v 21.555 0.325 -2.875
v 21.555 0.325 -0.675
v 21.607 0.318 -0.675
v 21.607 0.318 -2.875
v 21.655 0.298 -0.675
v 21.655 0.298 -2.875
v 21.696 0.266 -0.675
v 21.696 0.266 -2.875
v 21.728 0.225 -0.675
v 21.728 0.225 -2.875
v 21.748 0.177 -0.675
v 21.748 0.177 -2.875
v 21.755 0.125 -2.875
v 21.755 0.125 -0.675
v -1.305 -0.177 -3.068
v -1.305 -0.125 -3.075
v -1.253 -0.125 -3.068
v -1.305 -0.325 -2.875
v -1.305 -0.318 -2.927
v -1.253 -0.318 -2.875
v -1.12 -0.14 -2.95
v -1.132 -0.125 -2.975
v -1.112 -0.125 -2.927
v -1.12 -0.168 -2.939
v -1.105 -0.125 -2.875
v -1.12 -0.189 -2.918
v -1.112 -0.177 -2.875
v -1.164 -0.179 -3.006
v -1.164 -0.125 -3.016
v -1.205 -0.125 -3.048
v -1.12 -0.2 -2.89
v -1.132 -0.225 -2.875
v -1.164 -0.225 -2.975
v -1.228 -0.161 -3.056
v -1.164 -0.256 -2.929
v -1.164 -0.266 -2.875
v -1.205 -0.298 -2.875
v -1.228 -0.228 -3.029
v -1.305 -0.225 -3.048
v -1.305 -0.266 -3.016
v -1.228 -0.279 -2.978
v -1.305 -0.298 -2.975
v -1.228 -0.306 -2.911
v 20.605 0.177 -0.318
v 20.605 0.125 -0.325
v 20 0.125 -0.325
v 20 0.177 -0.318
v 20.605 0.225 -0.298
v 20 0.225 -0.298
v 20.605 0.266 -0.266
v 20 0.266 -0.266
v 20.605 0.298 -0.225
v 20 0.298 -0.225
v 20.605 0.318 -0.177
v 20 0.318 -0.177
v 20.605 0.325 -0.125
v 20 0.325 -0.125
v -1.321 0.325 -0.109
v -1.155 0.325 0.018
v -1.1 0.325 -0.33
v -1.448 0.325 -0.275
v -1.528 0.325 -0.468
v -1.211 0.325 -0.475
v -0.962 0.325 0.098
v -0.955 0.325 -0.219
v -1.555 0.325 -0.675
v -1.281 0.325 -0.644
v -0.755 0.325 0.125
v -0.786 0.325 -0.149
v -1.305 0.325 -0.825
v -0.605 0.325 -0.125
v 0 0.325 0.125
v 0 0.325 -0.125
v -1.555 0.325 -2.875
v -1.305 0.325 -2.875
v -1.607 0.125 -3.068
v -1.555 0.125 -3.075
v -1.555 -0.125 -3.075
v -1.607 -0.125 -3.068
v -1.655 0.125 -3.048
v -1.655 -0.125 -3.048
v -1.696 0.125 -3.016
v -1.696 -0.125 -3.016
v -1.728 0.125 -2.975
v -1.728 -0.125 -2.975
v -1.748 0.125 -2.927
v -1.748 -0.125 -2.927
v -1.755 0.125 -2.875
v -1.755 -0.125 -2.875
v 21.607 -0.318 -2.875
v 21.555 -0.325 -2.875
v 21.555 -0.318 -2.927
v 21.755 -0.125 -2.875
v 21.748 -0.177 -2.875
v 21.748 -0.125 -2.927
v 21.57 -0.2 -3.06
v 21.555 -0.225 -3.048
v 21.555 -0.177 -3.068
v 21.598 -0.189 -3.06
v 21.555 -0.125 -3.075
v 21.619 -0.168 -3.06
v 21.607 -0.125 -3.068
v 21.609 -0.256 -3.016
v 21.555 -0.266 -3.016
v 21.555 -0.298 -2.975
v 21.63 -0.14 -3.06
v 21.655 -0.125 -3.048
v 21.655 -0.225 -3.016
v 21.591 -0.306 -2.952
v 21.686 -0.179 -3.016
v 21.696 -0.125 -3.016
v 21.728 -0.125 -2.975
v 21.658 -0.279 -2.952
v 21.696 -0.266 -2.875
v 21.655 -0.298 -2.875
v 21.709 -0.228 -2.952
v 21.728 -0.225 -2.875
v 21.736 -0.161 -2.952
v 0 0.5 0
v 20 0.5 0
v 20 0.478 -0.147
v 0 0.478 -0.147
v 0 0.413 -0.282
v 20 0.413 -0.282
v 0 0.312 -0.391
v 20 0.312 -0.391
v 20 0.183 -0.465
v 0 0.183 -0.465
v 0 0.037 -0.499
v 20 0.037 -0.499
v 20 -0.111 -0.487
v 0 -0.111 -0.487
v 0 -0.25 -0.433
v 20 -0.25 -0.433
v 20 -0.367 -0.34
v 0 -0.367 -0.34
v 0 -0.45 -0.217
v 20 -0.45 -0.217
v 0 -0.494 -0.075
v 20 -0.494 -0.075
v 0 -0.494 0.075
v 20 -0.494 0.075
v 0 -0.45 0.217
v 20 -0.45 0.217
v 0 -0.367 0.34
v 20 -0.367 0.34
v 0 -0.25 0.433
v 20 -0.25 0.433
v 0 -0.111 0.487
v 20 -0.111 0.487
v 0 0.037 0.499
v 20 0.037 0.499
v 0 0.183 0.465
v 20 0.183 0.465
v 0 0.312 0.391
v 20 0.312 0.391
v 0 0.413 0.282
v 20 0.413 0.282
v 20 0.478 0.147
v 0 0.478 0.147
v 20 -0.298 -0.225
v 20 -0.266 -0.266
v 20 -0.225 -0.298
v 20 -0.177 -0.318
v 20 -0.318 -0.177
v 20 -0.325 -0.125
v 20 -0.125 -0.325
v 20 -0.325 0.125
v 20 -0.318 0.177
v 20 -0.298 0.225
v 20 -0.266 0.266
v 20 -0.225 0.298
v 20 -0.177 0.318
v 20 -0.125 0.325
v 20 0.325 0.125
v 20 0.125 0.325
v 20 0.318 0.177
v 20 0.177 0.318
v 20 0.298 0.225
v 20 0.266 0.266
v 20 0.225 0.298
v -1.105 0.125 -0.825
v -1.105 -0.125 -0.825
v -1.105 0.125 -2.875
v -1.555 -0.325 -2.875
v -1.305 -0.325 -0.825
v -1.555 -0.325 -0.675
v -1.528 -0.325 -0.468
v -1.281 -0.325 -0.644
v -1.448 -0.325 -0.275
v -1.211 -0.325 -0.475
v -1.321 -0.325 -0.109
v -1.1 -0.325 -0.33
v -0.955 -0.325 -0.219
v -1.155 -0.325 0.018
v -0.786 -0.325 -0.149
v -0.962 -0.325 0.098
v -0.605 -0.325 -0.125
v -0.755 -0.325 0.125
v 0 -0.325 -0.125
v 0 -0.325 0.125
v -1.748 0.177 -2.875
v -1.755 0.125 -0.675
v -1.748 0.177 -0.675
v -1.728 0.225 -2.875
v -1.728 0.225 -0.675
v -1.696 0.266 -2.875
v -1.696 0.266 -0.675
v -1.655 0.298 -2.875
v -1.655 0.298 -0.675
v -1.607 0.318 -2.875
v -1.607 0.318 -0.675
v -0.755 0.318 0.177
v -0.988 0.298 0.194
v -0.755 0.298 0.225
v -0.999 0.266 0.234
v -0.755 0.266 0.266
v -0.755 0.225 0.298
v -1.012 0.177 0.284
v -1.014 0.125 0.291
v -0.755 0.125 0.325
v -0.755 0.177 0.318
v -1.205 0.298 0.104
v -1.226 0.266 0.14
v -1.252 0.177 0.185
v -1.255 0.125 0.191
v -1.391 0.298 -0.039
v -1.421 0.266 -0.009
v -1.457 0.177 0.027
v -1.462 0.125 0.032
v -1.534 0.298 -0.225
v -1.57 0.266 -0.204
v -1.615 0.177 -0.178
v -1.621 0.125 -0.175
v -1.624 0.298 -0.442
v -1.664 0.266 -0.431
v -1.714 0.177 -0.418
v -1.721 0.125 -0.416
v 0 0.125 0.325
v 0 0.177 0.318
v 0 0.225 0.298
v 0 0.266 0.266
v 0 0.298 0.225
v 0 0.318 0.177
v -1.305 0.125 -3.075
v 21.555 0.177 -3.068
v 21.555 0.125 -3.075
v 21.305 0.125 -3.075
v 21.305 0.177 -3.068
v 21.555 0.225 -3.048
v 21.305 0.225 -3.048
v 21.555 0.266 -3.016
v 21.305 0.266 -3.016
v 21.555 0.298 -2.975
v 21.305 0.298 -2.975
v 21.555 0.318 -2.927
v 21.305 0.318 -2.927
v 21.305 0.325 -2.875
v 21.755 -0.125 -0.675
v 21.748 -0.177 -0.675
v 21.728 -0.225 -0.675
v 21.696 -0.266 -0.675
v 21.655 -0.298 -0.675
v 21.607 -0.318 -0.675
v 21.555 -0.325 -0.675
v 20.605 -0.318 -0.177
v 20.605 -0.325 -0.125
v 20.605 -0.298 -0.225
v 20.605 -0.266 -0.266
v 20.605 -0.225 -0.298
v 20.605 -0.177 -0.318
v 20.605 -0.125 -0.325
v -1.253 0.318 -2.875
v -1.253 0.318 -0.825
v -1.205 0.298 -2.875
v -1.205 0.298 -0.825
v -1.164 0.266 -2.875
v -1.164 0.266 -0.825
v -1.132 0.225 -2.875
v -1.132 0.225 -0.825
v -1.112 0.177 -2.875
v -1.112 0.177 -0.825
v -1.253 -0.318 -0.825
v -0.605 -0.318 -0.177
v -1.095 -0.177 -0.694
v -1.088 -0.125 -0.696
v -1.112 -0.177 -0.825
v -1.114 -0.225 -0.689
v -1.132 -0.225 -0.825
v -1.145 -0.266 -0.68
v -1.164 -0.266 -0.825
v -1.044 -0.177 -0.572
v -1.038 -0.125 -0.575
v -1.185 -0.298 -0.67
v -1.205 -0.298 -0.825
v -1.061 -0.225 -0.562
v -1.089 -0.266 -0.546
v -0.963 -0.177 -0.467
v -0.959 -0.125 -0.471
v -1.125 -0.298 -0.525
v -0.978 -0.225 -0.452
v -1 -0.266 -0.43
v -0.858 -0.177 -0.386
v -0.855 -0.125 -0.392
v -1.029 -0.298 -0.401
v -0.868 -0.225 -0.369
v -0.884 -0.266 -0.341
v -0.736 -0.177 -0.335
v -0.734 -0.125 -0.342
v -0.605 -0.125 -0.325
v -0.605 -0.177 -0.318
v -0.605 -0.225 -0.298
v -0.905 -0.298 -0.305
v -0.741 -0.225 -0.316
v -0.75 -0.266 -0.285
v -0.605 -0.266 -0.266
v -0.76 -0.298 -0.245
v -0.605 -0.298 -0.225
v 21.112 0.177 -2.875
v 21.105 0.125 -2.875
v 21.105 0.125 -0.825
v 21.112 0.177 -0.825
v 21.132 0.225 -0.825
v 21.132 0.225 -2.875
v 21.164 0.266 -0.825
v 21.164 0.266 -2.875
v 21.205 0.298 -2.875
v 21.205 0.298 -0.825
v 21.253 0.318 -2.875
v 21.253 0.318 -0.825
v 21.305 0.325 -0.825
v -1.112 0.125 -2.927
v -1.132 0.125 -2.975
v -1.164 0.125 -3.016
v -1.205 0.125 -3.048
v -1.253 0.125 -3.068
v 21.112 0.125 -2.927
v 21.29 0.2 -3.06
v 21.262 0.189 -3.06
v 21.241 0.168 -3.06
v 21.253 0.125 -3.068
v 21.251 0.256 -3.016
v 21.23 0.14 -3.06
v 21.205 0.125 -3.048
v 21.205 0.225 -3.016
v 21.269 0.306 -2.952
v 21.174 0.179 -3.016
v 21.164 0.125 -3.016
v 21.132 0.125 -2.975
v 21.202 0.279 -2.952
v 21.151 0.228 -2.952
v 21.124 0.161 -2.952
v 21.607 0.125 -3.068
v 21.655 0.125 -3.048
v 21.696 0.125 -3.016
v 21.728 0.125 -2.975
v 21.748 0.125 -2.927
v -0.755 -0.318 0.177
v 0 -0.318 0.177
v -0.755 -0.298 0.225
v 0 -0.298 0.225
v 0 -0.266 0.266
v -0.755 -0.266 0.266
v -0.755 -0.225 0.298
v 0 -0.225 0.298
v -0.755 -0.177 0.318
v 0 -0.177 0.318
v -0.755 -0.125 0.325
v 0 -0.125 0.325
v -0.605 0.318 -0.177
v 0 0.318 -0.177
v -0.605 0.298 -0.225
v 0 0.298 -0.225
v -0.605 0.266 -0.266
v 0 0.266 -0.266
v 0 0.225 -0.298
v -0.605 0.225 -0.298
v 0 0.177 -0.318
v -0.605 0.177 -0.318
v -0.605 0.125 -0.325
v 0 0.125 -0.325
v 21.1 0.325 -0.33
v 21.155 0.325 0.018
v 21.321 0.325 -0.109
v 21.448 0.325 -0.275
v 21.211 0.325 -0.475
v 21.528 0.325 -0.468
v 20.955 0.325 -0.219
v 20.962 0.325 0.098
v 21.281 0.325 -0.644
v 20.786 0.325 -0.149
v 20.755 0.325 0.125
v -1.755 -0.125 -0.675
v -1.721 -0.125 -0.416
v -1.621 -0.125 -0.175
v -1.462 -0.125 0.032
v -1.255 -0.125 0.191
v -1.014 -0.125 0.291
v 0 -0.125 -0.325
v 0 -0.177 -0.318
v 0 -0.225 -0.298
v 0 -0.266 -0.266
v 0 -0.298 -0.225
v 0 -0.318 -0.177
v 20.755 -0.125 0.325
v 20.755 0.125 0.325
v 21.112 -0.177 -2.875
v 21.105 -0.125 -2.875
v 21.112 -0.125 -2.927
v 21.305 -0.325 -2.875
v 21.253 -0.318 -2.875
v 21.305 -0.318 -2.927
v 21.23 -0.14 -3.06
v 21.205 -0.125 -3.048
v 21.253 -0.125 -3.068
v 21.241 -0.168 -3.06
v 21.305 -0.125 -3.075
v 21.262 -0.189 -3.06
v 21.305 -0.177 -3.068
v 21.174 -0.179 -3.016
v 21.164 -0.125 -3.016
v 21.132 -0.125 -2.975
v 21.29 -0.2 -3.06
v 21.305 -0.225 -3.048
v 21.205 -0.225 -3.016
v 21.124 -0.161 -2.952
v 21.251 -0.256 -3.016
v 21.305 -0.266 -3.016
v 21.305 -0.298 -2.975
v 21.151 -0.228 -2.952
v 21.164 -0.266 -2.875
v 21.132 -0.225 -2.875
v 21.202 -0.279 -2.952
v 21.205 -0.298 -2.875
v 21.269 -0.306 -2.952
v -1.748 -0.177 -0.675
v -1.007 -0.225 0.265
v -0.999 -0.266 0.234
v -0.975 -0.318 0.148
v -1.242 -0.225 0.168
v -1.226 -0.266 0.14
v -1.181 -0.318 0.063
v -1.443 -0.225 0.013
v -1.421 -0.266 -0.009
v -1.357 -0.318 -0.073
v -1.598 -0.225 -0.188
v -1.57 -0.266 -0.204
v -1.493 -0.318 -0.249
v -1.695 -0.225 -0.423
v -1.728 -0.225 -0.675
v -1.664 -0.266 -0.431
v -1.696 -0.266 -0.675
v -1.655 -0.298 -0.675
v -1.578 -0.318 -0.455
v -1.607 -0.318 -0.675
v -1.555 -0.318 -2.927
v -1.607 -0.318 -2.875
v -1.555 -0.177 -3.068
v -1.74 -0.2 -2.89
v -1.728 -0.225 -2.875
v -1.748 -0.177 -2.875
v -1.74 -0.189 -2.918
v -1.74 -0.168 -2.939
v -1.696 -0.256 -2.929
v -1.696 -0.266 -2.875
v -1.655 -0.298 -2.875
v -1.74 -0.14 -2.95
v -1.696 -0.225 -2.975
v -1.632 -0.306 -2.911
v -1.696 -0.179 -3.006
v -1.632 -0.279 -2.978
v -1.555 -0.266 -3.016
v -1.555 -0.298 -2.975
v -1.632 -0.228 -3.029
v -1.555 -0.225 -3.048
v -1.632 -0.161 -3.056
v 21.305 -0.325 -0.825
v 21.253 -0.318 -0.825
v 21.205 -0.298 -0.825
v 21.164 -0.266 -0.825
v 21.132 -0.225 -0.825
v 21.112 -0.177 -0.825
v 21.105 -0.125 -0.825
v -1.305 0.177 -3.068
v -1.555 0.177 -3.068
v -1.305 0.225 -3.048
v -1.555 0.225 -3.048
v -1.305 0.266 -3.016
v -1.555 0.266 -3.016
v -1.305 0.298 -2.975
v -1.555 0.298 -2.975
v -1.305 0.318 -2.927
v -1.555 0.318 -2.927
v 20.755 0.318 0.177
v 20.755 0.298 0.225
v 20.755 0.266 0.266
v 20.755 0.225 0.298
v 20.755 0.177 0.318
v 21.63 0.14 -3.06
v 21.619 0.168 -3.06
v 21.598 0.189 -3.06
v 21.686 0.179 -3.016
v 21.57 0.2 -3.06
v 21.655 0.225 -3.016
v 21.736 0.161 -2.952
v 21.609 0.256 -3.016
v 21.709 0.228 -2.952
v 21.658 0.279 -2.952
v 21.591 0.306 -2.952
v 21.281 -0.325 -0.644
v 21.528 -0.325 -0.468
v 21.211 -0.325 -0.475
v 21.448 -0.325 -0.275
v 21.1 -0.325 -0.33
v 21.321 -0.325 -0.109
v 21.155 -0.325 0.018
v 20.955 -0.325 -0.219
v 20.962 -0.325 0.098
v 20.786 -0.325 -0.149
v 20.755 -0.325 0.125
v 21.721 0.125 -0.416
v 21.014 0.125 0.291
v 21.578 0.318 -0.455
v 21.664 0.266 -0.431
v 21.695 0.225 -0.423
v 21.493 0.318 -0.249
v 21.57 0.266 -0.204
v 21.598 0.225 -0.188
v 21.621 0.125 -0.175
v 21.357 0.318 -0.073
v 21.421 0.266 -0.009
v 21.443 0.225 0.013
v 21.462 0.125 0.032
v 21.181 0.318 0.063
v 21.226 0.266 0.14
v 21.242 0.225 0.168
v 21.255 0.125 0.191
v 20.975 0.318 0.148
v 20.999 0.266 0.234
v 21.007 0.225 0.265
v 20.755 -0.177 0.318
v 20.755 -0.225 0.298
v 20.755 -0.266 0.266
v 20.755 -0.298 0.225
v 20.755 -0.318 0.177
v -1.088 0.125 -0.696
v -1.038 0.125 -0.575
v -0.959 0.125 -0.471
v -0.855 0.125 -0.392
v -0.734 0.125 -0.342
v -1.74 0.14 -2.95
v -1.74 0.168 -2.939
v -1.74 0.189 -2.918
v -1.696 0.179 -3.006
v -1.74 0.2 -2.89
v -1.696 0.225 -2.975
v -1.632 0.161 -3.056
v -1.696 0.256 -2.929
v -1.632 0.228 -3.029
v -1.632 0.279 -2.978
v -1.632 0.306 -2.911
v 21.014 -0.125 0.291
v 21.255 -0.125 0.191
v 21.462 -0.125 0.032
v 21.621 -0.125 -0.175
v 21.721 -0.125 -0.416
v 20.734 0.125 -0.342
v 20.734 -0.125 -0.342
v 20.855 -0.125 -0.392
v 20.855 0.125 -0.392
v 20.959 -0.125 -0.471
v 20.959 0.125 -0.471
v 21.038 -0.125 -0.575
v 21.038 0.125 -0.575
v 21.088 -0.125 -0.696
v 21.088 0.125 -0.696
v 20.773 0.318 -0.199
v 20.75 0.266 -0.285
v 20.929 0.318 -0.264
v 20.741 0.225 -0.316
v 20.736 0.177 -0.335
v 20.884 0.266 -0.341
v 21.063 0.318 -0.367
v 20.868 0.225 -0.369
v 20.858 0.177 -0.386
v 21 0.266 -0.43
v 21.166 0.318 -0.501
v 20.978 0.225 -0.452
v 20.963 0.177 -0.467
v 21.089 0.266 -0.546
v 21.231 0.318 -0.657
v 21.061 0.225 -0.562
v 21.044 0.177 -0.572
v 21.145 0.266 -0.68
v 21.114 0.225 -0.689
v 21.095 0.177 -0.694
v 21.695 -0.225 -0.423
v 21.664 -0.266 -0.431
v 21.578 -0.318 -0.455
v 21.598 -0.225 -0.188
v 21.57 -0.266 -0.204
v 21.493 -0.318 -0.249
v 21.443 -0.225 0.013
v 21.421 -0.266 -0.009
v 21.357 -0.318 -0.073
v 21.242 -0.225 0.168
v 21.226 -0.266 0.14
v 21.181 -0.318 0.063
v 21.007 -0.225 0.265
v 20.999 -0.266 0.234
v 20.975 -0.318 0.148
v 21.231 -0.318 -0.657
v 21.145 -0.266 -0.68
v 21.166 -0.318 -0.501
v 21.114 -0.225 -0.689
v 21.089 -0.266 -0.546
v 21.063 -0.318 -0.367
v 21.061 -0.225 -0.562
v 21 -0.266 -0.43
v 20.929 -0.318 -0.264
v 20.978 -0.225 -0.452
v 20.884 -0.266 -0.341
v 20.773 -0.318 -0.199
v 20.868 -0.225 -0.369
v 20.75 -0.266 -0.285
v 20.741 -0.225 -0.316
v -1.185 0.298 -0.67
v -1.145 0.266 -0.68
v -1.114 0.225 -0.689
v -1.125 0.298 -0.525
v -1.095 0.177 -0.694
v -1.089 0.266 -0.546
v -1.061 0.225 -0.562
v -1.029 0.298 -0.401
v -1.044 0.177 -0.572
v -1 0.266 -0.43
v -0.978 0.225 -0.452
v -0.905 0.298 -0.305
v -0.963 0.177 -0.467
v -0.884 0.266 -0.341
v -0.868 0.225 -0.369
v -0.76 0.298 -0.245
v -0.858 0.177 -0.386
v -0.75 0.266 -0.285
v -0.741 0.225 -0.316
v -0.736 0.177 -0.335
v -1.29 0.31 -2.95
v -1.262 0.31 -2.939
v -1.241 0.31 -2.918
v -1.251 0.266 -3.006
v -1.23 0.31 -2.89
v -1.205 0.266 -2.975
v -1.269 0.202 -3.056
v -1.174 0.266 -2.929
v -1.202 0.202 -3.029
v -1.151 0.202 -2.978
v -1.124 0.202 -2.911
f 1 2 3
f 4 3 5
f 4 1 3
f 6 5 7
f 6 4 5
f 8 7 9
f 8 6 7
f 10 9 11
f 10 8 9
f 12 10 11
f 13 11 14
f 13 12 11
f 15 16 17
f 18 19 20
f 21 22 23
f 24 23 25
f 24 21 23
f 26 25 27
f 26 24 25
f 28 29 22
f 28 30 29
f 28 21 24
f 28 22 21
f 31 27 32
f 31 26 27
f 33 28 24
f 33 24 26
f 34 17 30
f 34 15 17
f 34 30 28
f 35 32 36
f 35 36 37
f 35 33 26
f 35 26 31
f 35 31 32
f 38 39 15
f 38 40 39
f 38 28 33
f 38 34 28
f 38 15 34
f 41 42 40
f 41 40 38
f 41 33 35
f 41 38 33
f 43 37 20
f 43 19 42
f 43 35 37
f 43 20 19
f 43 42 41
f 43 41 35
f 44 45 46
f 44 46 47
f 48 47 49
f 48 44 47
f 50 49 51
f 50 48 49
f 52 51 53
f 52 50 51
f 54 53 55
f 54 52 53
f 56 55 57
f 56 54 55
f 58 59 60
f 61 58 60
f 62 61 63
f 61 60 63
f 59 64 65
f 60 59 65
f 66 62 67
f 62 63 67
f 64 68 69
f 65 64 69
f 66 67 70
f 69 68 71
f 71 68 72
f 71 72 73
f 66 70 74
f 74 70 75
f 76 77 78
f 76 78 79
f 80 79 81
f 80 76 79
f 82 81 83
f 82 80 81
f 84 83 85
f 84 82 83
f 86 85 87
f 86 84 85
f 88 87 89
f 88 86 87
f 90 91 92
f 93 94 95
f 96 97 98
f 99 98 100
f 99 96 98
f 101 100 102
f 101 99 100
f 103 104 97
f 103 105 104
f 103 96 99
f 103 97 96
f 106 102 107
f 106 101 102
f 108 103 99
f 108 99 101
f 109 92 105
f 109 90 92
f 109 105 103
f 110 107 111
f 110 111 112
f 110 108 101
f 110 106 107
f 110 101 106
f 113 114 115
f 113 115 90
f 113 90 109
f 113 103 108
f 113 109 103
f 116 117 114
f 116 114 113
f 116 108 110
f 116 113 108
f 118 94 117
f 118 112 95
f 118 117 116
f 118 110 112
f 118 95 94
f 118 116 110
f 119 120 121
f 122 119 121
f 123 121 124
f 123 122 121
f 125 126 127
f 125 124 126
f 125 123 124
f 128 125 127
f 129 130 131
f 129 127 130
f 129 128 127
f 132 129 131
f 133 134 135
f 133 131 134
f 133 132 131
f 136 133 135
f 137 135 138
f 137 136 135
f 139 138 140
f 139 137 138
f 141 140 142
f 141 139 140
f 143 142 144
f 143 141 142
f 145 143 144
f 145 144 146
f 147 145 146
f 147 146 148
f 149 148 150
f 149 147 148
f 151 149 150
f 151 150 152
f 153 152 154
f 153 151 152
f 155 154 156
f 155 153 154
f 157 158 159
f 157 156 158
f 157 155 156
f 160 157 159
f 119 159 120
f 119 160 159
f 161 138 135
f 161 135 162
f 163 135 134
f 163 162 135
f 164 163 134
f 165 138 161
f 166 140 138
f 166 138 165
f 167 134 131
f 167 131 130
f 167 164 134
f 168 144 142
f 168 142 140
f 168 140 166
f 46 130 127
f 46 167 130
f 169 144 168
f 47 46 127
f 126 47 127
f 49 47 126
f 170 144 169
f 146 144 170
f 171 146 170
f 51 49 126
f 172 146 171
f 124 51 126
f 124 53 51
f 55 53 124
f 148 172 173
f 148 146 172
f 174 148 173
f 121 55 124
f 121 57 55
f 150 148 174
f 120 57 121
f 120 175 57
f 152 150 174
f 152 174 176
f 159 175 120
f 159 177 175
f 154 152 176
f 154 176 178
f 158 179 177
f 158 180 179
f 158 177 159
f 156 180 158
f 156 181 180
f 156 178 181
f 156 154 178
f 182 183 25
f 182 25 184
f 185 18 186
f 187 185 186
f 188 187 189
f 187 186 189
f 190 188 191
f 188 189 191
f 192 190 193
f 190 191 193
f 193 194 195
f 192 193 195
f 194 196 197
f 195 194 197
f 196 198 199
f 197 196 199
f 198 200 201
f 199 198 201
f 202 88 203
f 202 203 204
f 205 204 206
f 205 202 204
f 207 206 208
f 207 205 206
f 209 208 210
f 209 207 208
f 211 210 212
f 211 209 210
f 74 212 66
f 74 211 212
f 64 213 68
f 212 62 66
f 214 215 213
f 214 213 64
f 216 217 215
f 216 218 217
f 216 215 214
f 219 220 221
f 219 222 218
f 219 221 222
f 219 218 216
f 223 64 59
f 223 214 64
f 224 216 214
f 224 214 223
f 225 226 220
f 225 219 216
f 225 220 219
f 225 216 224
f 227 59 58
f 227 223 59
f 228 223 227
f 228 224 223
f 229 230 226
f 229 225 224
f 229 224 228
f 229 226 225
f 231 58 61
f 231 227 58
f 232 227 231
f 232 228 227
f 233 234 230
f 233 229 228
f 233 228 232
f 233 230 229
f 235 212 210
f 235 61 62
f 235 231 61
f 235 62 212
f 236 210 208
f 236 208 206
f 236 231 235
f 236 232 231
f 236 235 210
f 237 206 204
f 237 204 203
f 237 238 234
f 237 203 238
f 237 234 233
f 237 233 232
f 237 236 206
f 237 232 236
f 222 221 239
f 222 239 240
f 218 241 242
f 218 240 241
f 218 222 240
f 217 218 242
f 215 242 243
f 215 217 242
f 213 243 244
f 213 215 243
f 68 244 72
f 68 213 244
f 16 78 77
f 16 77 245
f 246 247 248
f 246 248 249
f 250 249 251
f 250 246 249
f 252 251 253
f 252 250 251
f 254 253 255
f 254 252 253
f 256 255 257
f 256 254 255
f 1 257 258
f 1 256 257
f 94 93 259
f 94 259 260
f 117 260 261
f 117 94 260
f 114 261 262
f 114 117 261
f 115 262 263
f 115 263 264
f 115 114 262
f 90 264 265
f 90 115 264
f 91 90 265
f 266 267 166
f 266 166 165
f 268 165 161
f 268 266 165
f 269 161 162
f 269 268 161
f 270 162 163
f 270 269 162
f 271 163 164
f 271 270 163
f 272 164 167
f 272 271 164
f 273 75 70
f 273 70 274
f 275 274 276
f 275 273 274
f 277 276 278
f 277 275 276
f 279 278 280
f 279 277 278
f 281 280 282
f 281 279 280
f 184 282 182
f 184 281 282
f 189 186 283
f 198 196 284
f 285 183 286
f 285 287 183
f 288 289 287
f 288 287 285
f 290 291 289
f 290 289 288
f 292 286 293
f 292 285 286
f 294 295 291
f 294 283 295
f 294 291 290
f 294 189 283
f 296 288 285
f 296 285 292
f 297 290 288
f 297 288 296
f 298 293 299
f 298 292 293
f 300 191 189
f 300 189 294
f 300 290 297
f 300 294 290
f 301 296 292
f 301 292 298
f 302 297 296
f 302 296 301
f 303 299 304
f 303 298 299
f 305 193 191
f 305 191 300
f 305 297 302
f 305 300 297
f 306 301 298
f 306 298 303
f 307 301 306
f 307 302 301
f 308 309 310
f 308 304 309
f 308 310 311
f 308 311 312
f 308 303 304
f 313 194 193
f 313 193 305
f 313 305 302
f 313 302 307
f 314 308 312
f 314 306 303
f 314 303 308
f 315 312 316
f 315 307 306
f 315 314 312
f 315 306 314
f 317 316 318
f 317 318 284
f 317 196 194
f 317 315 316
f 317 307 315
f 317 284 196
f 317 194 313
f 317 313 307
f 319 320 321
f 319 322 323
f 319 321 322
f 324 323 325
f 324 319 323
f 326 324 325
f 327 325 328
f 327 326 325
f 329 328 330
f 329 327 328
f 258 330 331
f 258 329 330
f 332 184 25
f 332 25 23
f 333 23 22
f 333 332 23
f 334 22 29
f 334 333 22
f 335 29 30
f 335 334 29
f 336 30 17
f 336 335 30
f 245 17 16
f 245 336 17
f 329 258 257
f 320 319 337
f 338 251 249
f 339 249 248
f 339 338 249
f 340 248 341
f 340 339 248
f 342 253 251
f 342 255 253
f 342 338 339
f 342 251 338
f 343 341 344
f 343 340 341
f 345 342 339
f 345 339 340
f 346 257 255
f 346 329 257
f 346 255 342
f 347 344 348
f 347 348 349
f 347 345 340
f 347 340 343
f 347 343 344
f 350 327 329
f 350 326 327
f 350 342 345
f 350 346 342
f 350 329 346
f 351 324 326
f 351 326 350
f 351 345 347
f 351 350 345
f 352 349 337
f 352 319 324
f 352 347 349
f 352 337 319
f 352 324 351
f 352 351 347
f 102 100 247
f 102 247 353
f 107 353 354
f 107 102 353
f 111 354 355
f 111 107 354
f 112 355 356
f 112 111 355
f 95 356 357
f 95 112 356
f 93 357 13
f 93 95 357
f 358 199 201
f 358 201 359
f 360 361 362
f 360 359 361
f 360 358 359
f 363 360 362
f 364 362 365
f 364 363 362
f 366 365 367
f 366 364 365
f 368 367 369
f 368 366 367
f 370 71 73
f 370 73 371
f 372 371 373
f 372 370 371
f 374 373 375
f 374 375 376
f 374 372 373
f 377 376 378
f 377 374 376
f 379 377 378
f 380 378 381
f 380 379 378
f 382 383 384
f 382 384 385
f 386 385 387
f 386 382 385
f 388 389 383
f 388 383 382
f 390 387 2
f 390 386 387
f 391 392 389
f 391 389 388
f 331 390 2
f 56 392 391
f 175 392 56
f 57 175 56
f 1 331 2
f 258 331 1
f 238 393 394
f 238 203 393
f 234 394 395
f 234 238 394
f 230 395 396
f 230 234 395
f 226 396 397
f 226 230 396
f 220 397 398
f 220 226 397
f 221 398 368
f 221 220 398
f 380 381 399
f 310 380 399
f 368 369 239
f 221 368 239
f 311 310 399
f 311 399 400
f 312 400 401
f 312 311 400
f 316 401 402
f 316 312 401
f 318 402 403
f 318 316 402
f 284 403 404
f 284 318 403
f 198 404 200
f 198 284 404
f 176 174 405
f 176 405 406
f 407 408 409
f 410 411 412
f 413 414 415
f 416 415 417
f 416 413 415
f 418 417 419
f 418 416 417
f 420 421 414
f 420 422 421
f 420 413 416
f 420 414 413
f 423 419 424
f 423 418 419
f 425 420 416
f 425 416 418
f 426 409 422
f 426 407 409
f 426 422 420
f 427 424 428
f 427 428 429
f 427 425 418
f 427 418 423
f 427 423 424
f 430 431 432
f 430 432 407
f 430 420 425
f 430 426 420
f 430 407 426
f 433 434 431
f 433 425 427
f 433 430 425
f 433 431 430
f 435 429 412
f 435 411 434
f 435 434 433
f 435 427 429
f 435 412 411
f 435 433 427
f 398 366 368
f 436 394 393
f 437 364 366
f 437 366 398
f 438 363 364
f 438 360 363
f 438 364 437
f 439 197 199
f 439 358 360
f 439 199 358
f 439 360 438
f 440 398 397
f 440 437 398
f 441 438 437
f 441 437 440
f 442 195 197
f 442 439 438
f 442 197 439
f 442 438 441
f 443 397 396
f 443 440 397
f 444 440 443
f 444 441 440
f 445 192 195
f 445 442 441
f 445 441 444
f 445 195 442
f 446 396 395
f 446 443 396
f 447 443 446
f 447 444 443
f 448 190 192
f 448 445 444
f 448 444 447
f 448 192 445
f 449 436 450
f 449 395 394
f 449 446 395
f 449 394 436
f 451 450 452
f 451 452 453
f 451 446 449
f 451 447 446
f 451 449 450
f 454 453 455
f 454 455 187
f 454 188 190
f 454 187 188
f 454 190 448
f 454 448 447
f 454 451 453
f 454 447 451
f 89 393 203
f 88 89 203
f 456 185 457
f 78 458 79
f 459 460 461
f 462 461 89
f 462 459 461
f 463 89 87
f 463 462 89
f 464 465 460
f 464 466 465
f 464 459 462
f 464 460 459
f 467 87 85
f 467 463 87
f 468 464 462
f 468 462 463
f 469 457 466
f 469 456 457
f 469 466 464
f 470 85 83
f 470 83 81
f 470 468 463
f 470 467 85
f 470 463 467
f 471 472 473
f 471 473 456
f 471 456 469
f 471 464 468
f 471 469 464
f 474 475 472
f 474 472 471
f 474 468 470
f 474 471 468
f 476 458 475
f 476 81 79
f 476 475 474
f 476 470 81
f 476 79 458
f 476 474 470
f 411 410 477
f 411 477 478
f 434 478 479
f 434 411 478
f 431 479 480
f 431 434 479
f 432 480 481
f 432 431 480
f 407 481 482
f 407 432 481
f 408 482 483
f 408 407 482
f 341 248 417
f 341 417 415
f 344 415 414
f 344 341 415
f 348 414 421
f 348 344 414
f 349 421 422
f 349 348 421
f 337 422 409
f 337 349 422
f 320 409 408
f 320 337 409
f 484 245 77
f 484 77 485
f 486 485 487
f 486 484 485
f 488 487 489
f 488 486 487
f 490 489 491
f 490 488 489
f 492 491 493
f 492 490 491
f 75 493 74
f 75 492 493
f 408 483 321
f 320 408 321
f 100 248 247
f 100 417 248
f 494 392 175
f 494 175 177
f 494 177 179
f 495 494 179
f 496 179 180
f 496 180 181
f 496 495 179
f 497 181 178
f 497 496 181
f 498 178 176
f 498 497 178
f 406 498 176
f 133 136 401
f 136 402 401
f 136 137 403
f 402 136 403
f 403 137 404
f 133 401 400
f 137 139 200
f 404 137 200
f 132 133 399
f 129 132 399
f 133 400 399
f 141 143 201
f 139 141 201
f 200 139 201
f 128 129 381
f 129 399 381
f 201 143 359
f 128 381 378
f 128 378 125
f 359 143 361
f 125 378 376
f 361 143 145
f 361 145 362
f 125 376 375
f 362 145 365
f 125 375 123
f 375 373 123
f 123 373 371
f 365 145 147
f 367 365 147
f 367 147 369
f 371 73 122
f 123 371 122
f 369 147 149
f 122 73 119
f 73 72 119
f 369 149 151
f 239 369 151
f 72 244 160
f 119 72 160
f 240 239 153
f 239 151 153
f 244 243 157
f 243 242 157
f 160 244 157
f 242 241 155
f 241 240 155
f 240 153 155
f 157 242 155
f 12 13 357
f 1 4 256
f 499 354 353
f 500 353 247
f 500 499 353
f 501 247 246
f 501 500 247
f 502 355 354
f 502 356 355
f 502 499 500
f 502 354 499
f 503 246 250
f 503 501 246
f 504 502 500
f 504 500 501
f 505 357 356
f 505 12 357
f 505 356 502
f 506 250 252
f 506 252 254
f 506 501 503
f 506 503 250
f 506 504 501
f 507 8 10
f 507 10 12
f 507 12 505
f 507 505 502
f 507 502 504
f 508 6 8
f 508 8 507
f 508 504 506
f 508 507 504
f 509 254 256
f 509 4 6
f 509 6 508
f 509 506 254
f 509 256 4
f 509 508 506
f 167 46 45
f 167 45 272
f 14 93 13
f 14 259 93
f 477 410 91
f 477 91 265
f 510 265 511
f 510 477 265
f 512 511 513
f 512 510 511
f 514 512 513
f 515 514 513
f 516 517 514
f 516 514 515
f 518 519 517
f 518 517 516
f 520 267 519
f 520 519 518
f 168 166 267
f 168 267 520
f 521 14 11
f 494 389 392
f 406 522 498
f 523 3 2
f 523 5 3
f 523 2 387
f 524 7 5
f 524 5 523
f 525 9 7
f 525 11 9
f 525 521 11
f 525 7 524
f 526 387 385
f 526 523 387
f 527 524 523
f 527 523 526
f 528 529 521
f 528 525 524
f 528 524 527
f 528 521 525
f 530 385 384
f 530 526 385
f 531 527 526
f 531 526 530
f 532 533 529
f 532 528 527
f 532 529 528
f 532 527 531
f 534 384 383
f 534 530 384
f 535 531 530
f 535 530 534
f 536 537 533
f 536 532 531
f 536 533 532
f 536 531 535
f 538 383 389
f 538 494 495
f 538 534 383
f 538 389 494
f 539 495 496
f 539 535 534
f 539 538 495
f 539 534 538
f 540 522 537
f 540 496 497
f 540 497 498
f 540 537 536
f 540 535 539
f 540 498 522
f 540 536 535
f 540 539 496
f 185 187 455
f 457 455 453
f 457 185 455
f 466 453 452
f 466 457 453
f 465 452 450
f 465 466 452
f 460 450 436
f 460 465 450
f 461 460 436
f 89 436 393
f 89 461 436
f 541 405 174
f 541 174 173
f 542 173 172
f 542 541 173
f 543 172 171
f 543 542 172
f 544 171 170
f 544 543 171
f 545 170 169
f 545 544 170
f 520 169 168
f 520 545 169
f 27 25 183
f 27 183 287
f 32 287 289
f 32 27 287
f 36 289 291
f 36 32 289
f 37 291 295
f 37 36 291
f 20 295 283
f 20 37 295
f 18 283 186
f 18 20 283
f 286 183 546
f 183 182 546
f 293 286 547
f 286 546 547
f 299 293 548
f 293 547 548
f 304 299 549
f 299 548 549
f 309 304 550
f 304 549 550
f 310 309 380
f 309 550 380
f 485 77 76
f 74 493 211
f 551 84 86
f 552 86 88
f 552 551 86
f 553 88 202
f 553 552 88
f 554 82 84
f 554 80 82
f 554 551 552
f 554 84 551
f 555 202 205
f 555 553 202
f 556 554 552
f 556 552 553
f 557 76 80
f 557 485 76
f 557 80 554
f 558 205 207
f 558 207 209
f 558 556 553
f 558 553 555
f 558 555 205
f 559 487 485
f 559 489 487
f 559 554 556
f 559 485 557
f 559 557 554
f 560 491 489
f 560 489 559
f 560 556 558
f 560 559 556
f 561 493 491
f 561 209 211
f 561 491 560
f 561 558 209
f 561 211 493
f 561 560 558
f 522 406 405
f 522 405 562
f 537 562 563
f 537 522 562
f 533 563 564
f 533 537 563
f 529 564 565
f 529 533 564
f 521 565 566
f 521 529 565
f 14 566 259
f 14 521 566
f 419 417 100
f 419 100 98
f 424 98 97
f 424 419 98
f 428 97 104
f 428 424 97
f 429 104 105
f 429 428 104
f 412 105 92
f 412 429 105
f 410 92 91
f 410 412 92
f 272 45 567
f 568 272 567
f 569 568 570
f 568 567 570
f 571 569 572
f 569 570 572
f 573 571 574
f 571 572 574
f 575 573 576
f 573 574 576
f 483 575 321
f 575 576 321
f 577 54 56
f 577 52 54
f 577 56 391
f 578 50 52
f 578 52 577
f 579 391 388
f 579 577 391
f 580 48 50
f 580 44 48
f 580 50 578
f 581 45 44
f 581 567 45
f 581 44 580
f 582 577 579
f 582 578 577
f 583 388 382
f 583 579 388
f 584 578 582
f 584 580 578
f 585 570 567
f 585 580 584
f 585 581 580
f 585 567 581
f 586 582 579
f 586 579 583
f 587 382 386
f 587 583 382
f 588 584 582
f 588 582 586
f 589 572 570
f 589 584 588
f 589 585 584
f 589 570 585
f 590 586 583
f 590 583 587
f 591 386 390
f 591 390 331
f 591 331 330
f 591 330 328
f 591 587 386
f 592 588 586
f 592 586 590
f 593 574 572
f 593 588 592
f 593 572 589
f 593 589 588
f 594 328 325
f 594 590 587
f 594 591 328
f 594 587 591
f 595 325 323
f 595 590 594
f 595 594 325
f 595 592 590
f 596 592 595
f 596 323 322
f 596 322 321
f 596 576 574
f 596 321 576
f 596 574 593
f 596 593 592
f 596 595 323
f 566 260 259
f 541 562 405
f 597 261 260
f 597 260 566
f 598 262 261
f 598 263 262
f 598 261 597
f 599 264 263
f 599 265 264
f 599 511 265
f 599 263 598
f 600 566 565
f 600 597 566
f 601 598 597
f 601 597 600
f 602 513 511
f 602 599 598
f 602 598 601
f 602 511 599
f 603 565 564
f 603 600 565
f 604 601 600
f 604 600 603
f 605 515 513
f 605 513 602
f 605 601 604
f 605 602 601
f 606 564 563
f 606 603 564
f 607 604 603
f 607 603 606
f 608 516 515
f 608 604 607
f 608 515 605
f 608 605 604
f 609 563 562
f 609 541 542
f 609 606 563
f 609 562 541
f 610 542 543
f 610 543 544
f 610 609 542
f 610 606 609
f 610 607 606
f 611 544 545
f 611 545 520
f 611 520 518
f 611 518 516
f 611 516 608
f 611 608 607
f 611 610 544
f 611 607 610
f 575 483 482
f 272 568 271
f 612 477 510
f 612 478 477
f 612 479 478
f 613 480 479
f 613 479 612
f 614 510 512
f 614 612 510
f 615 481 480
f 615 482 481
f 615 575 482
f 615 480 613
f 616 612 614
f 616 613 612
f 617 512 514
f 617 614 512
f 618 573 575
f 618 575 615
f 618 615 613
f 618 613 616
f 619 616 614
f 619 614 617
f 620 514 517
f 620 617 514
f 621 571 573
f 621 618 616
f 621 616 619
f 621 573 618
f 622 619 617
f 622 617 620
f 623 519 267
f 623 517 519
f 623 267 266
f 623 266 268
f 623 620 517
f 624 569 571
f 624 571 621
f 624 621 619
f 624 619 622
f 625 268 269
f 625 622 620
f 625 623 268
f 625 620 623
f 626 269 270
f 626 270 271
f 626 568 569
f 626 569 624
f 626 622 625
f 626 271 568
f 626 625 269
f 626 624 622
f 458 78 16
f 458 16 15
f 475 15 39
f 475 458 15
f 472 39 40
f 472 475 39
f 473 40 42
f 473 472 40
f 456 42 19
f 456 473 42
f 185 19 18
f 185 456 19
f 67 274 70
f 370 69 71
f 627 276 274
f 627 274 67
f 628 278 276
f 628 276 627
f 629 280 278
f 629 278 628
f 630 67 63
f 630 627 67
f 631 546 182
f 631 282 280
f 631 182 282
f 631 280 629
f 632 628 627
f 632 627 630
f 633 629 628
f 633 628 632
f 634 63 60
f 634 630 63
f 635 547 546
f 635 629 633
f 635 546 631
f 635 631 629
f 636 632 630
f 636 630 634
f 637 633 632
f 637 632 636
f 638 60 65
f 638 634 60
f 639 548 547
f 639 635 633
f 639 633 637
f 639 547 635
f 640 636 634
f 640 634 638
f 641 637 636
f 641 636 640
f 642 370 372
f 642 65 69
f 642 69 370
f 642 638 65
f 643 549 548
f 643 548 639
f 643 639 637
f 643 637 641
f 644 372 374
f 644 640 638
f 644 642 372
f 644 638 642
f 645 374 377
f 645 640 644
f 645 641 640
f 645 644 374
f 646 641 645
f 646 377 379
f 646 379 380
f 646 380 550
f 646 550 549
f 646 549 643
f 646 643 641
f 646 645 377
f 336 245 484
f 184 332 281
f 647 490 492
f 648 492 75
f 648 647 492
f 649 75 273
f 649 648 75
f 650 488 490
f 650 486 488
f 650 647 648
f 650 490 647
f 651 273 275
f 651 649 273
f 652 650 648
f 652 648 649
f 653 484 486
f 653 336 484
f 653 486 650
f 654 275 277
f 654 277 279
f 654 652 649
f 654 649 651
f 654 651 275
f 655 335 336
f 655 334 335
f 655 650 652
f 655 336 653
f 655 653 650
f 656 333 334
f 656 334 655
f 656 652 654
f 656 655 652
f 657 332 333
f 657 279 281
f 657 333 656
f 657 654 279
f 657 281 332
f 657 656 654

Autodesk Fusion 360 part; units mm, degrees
sketch "Sketch1" plane through (0, 0, 0) normal (1, 0, 0) x (0, 1, 0)
  circle A0 centre (0, 0) radius 0.5
  line L0 (0.325, -0.325) -> (-0.325, -0.325)
  line L1 (-0.325, -0.325) -> (-0.325, 0.325)
  line L2 (-0.325, 0.325) -> (0.325, 0.325)
  line L3 (0.325, 0.325) -> (0.325, -0.325)
  line L4 (0.325, -0.325) -> (-0.325, 0.325) construction
  line L5 (-0.325, -0.325) -> (0.325, 0.325) construction
  dimension "d1" = 1
  dimension "d2" = 0.65
  dimension "d3" = 0.65
extrude "Extrude1" add sketch "Sketch1" along normal blind 20 contours A0 | L0 L1 L2 L3
sketch "Sketch2" plane through (20, 0, 0) normal (1, 0, 0) x (0, 1, 0)
  circle A0 centre (0, 0) radius 0.5
  line L0 (0.325, -0.325) -> (-0.325, -0.325)
  line L1 (-0.325, -0.325) -> (-0.325, 0.325)
  line L2 (-0.325, 0.325) -> (0.325, 0.325)
  line L3 (0.325, 0.325) -> (0.325, -0.325)
  line L4 (0.325, -0.325) -> (-0.325, 0.325) construction
  line L5 (-0.325, -0.325) -> (0.325, 0.325) construction
  dimension "d8" = 0.65
  dimension "d9" = 0.65
extrude "Extrude2" add sketch "Sketch2" along normal blind 1.755 contours L0 L1 L2 L3
extrude "Extrude3" add sketch "Sketch1" against normal blind 1.755 contours L0 L1 L2 L3
sketch "Sketch3" plane through (0, 0, -0.325) normal (0, 0, -1) x (1, 0, 0)
  line L0 (20, 0.325) -> (20, -0.325)
  line L1 (20, -0.325) -> (21.755, -0.325)
  line L2 (21.755, -0.325) -> (21.755, 0.325)
  line L3 (21.755, 0.325) -> (20, 0.325)
  line L4 (21.755, 0.325) -> (21.105, 0.325)
  line L5 (21.105, 0.325) -> (21.105, -0.325)
  line L6 (21.105, -0.325) -> (21.755, -0.325)
  line L7 (21.755, -0.325) -> (21.755, 0.325)
  line L8 (21.755, 0.325) -> (21.105, -0.325) construction
  line L9 (21.105, 0.325) -> (21.755, -0.325) construction
  point P0 (21.43, 0)
  dimension "d14" = 0.65
  dimension "d15" = 0.65
sketch "Sketch4" plane through (0, 0, -0.325) normal (0, 0, -1) x (1, 0, 0)
  line L0 (0, -0.325) -> (0, 0.325)
  line L1 (0, 0.325) -> (-1.755, 0.325)
  line L2 (-1.755, 0.325) -> (-1.755, -0.325)
  line L3 (-1.755, -0.325) -> (0, -0.325)
  line L4 (-1.105, -0.325) -> (-1.755, -0.325)
  line L5 (-1.755, -0.325) -> (-1.755, 0.325)
  line L6 (-1.755, 0.325) -> (-1.105, 0.325)
  line L7 (-1.105, 0.325) -> (-1.105, -0.325)
  line L8 (-1.105, -0.325) -> (-1.755, 0.325) construction
  line L9 (-1.755, -0.325) -> (-1.105, 0.325) construction
  point P0 (-1.43, 0)
  dimension "d17" = 0.65
  dimension "d18" = 0.65
extrude "Extrude4" add sketch "Sketch4" sketch "Sketch3" along normal blind 2.75 contours L1 L2 L3 L4 L5 L6 L7 of sketch 2 contours L1 L2 L3 L4 L5 L6 L7
fillet "Fillet1" radius 0.5 2 edges at (-1.105, 0, -0.325) (21.105, 0, -0.325)
fillet "Fillet2" radius 1 2 edges at (-1.755, 0, 0.325) (21.755, 0, 0.325)
fillet "Fillet3" radius 0.2 28 edges at (-1.43, -0.325, -3.075) (-1.105, 0, -3.075) (-1.43, 0.325, -3.075) (-1.755, 0, -3.075) (-0.9586, -0.325, -0.4714) (-1.105, -0.325, -1.95) (-0.3775, -0.325, 0.325) (-1.4621, -0.325, 0.0321) (-1.755, -0.325, -1.875) (-0.3775, 0.325, 0.325) (-1.4621, 0.325, 0.0321) (-1.755, 0.325, -1.875) (-0.9586, 0.325, -0.4714) (-1.105, 0.325, -1.95) (20.3775, -0.325, 0.325) (21.4621, -0.325, 0.0321) (21.755, -0.325, -1.875) (21.105, -0.325, -1.95) (20.9586, -0.325, -0.4714) (21.755, 0.325, -1.875) (21.4621, 0.325, 0.0321) (20.3775, 0.325, 0.325) (20.9586, 0.325, -0.4714) (21.105, 0.325, -1.95) (21.43, 0.325, -3.075) (21.755, 0, -3.075) (21.43, -0.325, -3.075) (21.105, 0, -3.075)
equation "d1 = width"
equation "d2 = d3"
equation "d3 = d1 * 0.65"
equation "width = 1 mm"
equation "baseLenght = 20 mm"
equation "d6 = baseLenght"
equation "d8 = width * 0.65"
equation "d9 = d8"
equation "d10 = ( ( 2.54 * ceil(( baseLenght + 1.3 * width ) / 2.54 mm) ) * 1 mm + 0.65 * width - baseLenght ) / 2"
equation "d12 = -( ( 2.54 * ceil(( baseLenght + 1.3 * width ) / 2.54 mm) ) * 1 mm + 0.65 * width - baseLenght ) / 2"
equation "d14 = width * 0.65"
equation "d15 = d14"
equation "d17 = width * 0.65"
equation "d18 = d17"
equation "d26 = 0.2 * width"
